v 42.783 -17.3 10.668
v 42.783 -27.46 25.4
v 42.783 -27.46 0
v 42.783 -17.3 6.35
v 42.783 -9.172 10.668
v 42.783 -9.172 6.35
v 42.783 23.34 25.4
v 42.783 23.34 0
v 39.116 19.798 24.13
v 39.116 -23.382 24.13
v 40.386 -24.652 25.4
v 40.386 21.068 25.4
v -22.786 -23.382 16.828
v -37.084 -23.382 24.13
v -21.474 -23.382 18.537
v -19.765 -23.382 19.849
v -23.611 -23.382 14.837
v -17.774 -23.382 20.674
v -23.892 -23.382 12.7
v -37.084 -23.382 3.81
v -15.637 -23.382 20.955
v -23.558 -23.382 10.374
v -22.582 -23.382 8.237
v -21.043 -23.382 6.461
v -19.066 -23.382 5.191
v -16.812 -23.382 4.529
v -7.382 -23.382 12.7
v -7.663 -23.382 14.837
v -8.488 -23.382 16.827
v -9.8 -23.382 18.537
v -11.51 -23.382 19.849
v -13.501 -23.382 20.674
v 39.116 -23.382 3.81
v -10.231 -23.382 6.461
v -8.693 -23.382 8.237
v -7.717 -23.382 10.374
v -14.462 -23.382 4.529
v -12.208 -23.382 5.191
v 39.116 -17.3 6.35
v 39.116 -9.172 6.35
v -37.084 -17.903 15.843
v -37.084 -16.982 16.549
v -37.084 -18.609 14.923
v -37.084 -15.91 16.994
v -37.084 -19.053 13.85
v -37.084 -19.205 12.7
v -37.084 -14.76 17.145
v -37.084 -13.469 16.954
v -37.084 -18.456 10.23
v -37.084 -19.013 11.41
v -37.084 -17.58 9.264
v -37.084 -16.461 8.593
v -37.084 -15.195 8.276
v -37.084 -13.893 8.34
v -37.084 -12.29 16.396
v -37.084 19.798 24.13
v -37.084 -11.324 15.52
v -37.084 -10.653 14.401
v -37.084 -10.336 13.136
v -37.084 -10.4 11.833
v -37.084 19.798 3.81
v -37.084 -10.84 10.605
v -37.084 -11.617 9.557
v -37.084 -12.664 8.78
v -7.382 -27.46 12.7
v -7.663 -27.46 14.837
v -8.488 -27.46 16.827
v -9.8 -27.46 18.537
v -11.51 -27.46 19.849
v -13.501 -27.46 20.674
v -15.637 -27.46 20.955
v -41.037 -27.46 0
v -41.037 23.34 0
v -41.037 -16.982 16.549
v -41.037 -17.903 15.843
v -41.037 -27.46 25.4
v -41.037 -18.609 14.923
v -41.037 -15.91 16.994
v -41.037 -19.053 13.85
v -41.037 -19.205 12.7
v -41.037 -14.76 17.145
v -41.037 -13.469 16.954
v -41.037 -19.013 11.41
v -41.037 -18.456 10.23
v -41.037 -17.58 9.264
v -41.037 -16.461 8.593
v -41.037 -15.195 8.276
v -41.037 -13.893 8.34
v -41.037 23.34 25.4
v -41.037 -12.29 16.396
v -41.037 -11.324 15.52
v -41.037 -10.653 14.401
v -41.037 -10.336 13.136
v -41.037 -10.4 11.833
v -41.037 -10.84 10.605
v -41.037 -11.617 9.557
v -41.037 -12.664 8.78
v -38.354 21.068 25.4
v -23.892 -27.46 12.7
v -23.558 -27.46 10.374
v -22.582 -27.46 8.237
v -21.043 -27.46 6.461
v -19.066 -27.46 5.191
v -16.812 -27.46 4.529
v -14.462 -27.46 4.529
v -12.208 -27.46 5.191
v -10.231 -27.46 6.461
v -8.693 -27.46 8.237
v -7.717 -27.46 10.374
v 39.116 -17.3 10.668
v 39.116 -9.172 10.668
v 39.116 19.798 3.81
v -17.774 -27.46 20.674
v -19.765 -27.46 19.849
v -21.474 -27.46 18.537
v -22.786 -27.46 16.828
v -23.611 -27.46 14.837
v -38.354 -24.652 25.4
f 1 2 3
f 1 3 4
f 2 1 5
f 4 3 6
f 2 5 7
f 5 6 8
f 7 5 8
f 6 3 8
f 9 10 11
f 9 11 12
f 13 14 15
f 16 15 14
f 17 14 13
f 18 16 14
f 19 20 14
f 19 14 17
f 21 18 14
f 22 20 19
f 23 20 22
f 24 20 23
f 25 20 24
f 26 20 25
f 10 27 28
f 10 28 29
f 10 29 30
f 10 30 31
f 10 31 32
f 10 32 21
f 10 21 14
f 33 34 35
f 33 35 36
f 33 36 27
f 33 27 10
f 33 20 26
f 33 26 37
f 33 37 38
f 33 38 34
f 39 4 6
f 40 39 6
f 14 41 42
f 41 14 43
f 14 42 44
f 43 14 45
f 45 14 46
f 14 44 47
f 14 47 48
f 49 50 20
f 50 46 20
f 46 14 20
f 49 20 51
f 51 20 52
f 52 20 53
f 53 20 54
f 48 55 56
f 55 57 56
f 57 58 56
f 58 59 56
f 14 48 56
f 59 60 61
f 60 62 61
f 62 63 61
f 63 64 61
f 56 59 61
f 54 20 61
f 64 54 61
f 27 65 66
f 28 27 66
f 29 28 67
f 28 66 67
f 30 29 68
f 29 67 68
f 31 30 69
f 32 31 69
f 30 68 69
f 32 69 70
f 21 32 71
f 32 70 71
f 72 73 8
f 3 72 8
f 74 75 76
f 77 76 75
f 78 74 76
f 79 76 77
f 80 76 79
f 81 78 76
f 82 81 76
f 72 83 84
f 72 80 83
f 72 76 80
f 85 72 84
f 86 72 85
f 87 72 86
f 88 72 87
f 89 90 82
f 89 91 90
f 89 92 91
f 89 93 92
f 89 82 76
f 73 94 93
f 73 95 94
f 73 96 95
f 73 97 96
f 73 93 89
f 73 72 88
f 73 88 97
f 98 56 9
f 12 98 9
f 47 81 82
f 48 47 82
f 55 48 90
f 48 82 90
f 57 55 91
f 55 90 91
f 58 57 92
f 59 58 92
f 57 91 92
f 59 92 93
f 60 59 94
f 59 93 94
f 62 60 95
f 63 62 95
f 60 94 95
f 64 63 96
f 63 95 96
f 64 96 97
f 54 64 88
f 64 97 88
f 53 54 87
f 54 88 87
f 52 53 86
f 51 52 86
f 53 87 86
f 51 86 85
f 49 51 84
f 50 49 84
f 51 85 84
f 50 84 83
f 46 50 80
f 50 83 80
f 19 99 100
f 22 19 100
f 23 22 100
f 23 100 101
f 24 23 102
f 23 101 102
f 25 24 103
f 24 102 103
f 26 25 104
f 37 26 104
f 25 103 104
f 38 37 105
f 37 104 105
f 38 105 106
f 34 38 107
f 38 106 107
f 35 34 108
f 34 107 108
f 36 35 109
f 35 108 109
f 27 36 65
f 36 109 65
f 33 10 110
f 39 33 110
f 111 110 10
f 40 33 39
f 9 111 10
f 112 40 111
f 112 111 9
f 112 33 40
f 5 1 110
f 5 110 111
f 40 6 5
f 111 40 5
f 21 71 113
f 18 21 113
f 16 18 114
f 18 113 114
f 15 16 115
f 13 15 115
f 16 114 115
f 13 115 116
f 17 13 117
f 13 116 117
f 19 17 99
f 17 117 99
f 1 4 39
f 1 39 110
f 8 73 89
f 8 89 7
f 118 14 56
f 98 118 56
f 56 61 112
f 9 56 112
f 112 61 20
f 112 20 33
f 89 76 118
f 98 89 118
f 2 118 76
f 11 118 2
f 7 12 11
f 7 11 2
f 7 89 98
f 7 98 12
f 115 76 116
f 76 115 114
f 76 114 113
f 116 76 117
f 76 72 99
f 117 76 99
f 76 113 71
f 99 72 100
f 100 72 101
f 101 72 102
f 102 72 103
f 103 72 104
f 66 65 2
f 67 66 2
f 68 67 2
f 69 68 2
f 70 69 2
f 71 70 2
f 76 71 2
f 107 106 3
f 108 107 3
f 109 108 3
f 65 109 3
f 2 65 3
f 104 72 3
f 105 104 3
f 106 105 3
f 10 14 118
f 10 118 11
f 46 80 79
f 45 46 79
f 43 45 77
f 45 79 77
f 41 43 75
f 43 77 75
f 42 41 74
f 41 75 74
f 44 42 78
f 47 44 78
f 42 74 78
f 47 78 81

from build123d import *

# Parameters (mm, degrees)
F0_W      = 83.82
F0_H      = 50.8
F1_DEPTH  = 3.81
F2_W      = 83.82
F2_H      = 50.8
F2_W_2    = 76.2
F2_H_2    = 43.18
F3_DEPTH  = 21.59
F5_DEPTH  = 5.08
F7_DEPTH  = 25.4
F8_SIZE2  = 1.27
F8_SIZE   = 1.27
F9_W      = 8.128
F9_H      = 4.318
F10_DEPTH = 25.4


with BuildPart() as f1:
    # F0 (on Top) → F1 (new body)
    with BuildSketch(Plane.XY):
        with Locations((0.872821, -2.059813)):
            Rectangle(F0_W, F0_H)
    extrude(amount=F1_DEPTH)

    # F2 (on face) → F3 (join)
    with BuildSketch(Plane.XY.offset(3.81)):
        with Locations((0.872821, -2.059813)):
            Rectangle(F2_W, F2_H)
        with Locations((1.016111, -1.792254)):
            Rectangle(F2_W_2, F2_H_2, mode=Mode.SUBTRACT)
    extrude(amount=F3_DEPTH)

    # F4 (on face) → F5 (cut)
    with BuildSketch(Plane.XZ.offset(27.459813)):
        with BuildLine():
            ThreePointArc((-23.892179, 12.7), (-15.637179, 4.445), (-7.382179, 12.7))
            ThreePointArc((-7.382179, 12.7), (-9.800013, 18.537166), (-15.637179, 20.955))
            Line((-15.637179, 20.955), (-15.637179, 12.7))
            Line((-15.637179, 12.7), (-23.892179, 12.7))
        make_face()
        with BuildLine():
            Line((-15.637179, 12.7), (-15.637179, 20.955))
            ThreePointArc((-15.637179, 20.955), (-21.474346, 18.537166), (-23.892179, 12.7))
            Line((-23.892179, 12.7), (-15.637179, 12.7))
        make_face()
    extrude(amount=-F5_DEPTH, mode=Mode.SUBTRACT)

    # F6 (on face) → F7 (cut)
    with BuildSketch(Plane(origin=(-41.037179, 0, 0), x_dir=(0, -1, 0), z_dir=(-1, 0, 0))):
        with BuildLine():
            Line((14.759813, 12.7), (19.204813, 12.7))
            ThreePointArc((19.204813, 12.7), (17.902903, 15.84309), (14.759813, 17.145))
            Line((14.759813, 17.145), (14.759813, 12.7))
        make_face()
        with BuildLine():
            ThreePointArc((14.759813, 17.145), (11.616724, 9.55691), (19.204813, 12.7))
            Line((19.204813, 12.7), (14.759813, 12.7))
            Line((14.759813, 12.7), (14.759813, 17.145))
        make_face()
    extrude(amount=-F7_DEPTH, mode=Mode.SUBTRACT)

    # F8
    f8_edges = [f1.edges().sort_by_distance(p)[0] for p in [
        (1.016111, 19.797746, 25.4),
        (-37.083889, -1.792254, 25.4),
        (1.016111, -23.382254, 25.4),
        (39.116111, -1.792254, 25.4),
    ]]
    chamfer(f8_edges, length=F8_SIZE, length2=F8_SIZE2)

    # F9 (on face) → F10 (cut)
    with BuildSketch(Plane.YZ.offset(42.782821)):
        with Locations((-13.235813, 8.509)):
            Rectangle(F9_W, F9_H)
    extrude(amount=-F10_DEPTH, mode=Mode.SUBTRACT)


solid = f1.part
